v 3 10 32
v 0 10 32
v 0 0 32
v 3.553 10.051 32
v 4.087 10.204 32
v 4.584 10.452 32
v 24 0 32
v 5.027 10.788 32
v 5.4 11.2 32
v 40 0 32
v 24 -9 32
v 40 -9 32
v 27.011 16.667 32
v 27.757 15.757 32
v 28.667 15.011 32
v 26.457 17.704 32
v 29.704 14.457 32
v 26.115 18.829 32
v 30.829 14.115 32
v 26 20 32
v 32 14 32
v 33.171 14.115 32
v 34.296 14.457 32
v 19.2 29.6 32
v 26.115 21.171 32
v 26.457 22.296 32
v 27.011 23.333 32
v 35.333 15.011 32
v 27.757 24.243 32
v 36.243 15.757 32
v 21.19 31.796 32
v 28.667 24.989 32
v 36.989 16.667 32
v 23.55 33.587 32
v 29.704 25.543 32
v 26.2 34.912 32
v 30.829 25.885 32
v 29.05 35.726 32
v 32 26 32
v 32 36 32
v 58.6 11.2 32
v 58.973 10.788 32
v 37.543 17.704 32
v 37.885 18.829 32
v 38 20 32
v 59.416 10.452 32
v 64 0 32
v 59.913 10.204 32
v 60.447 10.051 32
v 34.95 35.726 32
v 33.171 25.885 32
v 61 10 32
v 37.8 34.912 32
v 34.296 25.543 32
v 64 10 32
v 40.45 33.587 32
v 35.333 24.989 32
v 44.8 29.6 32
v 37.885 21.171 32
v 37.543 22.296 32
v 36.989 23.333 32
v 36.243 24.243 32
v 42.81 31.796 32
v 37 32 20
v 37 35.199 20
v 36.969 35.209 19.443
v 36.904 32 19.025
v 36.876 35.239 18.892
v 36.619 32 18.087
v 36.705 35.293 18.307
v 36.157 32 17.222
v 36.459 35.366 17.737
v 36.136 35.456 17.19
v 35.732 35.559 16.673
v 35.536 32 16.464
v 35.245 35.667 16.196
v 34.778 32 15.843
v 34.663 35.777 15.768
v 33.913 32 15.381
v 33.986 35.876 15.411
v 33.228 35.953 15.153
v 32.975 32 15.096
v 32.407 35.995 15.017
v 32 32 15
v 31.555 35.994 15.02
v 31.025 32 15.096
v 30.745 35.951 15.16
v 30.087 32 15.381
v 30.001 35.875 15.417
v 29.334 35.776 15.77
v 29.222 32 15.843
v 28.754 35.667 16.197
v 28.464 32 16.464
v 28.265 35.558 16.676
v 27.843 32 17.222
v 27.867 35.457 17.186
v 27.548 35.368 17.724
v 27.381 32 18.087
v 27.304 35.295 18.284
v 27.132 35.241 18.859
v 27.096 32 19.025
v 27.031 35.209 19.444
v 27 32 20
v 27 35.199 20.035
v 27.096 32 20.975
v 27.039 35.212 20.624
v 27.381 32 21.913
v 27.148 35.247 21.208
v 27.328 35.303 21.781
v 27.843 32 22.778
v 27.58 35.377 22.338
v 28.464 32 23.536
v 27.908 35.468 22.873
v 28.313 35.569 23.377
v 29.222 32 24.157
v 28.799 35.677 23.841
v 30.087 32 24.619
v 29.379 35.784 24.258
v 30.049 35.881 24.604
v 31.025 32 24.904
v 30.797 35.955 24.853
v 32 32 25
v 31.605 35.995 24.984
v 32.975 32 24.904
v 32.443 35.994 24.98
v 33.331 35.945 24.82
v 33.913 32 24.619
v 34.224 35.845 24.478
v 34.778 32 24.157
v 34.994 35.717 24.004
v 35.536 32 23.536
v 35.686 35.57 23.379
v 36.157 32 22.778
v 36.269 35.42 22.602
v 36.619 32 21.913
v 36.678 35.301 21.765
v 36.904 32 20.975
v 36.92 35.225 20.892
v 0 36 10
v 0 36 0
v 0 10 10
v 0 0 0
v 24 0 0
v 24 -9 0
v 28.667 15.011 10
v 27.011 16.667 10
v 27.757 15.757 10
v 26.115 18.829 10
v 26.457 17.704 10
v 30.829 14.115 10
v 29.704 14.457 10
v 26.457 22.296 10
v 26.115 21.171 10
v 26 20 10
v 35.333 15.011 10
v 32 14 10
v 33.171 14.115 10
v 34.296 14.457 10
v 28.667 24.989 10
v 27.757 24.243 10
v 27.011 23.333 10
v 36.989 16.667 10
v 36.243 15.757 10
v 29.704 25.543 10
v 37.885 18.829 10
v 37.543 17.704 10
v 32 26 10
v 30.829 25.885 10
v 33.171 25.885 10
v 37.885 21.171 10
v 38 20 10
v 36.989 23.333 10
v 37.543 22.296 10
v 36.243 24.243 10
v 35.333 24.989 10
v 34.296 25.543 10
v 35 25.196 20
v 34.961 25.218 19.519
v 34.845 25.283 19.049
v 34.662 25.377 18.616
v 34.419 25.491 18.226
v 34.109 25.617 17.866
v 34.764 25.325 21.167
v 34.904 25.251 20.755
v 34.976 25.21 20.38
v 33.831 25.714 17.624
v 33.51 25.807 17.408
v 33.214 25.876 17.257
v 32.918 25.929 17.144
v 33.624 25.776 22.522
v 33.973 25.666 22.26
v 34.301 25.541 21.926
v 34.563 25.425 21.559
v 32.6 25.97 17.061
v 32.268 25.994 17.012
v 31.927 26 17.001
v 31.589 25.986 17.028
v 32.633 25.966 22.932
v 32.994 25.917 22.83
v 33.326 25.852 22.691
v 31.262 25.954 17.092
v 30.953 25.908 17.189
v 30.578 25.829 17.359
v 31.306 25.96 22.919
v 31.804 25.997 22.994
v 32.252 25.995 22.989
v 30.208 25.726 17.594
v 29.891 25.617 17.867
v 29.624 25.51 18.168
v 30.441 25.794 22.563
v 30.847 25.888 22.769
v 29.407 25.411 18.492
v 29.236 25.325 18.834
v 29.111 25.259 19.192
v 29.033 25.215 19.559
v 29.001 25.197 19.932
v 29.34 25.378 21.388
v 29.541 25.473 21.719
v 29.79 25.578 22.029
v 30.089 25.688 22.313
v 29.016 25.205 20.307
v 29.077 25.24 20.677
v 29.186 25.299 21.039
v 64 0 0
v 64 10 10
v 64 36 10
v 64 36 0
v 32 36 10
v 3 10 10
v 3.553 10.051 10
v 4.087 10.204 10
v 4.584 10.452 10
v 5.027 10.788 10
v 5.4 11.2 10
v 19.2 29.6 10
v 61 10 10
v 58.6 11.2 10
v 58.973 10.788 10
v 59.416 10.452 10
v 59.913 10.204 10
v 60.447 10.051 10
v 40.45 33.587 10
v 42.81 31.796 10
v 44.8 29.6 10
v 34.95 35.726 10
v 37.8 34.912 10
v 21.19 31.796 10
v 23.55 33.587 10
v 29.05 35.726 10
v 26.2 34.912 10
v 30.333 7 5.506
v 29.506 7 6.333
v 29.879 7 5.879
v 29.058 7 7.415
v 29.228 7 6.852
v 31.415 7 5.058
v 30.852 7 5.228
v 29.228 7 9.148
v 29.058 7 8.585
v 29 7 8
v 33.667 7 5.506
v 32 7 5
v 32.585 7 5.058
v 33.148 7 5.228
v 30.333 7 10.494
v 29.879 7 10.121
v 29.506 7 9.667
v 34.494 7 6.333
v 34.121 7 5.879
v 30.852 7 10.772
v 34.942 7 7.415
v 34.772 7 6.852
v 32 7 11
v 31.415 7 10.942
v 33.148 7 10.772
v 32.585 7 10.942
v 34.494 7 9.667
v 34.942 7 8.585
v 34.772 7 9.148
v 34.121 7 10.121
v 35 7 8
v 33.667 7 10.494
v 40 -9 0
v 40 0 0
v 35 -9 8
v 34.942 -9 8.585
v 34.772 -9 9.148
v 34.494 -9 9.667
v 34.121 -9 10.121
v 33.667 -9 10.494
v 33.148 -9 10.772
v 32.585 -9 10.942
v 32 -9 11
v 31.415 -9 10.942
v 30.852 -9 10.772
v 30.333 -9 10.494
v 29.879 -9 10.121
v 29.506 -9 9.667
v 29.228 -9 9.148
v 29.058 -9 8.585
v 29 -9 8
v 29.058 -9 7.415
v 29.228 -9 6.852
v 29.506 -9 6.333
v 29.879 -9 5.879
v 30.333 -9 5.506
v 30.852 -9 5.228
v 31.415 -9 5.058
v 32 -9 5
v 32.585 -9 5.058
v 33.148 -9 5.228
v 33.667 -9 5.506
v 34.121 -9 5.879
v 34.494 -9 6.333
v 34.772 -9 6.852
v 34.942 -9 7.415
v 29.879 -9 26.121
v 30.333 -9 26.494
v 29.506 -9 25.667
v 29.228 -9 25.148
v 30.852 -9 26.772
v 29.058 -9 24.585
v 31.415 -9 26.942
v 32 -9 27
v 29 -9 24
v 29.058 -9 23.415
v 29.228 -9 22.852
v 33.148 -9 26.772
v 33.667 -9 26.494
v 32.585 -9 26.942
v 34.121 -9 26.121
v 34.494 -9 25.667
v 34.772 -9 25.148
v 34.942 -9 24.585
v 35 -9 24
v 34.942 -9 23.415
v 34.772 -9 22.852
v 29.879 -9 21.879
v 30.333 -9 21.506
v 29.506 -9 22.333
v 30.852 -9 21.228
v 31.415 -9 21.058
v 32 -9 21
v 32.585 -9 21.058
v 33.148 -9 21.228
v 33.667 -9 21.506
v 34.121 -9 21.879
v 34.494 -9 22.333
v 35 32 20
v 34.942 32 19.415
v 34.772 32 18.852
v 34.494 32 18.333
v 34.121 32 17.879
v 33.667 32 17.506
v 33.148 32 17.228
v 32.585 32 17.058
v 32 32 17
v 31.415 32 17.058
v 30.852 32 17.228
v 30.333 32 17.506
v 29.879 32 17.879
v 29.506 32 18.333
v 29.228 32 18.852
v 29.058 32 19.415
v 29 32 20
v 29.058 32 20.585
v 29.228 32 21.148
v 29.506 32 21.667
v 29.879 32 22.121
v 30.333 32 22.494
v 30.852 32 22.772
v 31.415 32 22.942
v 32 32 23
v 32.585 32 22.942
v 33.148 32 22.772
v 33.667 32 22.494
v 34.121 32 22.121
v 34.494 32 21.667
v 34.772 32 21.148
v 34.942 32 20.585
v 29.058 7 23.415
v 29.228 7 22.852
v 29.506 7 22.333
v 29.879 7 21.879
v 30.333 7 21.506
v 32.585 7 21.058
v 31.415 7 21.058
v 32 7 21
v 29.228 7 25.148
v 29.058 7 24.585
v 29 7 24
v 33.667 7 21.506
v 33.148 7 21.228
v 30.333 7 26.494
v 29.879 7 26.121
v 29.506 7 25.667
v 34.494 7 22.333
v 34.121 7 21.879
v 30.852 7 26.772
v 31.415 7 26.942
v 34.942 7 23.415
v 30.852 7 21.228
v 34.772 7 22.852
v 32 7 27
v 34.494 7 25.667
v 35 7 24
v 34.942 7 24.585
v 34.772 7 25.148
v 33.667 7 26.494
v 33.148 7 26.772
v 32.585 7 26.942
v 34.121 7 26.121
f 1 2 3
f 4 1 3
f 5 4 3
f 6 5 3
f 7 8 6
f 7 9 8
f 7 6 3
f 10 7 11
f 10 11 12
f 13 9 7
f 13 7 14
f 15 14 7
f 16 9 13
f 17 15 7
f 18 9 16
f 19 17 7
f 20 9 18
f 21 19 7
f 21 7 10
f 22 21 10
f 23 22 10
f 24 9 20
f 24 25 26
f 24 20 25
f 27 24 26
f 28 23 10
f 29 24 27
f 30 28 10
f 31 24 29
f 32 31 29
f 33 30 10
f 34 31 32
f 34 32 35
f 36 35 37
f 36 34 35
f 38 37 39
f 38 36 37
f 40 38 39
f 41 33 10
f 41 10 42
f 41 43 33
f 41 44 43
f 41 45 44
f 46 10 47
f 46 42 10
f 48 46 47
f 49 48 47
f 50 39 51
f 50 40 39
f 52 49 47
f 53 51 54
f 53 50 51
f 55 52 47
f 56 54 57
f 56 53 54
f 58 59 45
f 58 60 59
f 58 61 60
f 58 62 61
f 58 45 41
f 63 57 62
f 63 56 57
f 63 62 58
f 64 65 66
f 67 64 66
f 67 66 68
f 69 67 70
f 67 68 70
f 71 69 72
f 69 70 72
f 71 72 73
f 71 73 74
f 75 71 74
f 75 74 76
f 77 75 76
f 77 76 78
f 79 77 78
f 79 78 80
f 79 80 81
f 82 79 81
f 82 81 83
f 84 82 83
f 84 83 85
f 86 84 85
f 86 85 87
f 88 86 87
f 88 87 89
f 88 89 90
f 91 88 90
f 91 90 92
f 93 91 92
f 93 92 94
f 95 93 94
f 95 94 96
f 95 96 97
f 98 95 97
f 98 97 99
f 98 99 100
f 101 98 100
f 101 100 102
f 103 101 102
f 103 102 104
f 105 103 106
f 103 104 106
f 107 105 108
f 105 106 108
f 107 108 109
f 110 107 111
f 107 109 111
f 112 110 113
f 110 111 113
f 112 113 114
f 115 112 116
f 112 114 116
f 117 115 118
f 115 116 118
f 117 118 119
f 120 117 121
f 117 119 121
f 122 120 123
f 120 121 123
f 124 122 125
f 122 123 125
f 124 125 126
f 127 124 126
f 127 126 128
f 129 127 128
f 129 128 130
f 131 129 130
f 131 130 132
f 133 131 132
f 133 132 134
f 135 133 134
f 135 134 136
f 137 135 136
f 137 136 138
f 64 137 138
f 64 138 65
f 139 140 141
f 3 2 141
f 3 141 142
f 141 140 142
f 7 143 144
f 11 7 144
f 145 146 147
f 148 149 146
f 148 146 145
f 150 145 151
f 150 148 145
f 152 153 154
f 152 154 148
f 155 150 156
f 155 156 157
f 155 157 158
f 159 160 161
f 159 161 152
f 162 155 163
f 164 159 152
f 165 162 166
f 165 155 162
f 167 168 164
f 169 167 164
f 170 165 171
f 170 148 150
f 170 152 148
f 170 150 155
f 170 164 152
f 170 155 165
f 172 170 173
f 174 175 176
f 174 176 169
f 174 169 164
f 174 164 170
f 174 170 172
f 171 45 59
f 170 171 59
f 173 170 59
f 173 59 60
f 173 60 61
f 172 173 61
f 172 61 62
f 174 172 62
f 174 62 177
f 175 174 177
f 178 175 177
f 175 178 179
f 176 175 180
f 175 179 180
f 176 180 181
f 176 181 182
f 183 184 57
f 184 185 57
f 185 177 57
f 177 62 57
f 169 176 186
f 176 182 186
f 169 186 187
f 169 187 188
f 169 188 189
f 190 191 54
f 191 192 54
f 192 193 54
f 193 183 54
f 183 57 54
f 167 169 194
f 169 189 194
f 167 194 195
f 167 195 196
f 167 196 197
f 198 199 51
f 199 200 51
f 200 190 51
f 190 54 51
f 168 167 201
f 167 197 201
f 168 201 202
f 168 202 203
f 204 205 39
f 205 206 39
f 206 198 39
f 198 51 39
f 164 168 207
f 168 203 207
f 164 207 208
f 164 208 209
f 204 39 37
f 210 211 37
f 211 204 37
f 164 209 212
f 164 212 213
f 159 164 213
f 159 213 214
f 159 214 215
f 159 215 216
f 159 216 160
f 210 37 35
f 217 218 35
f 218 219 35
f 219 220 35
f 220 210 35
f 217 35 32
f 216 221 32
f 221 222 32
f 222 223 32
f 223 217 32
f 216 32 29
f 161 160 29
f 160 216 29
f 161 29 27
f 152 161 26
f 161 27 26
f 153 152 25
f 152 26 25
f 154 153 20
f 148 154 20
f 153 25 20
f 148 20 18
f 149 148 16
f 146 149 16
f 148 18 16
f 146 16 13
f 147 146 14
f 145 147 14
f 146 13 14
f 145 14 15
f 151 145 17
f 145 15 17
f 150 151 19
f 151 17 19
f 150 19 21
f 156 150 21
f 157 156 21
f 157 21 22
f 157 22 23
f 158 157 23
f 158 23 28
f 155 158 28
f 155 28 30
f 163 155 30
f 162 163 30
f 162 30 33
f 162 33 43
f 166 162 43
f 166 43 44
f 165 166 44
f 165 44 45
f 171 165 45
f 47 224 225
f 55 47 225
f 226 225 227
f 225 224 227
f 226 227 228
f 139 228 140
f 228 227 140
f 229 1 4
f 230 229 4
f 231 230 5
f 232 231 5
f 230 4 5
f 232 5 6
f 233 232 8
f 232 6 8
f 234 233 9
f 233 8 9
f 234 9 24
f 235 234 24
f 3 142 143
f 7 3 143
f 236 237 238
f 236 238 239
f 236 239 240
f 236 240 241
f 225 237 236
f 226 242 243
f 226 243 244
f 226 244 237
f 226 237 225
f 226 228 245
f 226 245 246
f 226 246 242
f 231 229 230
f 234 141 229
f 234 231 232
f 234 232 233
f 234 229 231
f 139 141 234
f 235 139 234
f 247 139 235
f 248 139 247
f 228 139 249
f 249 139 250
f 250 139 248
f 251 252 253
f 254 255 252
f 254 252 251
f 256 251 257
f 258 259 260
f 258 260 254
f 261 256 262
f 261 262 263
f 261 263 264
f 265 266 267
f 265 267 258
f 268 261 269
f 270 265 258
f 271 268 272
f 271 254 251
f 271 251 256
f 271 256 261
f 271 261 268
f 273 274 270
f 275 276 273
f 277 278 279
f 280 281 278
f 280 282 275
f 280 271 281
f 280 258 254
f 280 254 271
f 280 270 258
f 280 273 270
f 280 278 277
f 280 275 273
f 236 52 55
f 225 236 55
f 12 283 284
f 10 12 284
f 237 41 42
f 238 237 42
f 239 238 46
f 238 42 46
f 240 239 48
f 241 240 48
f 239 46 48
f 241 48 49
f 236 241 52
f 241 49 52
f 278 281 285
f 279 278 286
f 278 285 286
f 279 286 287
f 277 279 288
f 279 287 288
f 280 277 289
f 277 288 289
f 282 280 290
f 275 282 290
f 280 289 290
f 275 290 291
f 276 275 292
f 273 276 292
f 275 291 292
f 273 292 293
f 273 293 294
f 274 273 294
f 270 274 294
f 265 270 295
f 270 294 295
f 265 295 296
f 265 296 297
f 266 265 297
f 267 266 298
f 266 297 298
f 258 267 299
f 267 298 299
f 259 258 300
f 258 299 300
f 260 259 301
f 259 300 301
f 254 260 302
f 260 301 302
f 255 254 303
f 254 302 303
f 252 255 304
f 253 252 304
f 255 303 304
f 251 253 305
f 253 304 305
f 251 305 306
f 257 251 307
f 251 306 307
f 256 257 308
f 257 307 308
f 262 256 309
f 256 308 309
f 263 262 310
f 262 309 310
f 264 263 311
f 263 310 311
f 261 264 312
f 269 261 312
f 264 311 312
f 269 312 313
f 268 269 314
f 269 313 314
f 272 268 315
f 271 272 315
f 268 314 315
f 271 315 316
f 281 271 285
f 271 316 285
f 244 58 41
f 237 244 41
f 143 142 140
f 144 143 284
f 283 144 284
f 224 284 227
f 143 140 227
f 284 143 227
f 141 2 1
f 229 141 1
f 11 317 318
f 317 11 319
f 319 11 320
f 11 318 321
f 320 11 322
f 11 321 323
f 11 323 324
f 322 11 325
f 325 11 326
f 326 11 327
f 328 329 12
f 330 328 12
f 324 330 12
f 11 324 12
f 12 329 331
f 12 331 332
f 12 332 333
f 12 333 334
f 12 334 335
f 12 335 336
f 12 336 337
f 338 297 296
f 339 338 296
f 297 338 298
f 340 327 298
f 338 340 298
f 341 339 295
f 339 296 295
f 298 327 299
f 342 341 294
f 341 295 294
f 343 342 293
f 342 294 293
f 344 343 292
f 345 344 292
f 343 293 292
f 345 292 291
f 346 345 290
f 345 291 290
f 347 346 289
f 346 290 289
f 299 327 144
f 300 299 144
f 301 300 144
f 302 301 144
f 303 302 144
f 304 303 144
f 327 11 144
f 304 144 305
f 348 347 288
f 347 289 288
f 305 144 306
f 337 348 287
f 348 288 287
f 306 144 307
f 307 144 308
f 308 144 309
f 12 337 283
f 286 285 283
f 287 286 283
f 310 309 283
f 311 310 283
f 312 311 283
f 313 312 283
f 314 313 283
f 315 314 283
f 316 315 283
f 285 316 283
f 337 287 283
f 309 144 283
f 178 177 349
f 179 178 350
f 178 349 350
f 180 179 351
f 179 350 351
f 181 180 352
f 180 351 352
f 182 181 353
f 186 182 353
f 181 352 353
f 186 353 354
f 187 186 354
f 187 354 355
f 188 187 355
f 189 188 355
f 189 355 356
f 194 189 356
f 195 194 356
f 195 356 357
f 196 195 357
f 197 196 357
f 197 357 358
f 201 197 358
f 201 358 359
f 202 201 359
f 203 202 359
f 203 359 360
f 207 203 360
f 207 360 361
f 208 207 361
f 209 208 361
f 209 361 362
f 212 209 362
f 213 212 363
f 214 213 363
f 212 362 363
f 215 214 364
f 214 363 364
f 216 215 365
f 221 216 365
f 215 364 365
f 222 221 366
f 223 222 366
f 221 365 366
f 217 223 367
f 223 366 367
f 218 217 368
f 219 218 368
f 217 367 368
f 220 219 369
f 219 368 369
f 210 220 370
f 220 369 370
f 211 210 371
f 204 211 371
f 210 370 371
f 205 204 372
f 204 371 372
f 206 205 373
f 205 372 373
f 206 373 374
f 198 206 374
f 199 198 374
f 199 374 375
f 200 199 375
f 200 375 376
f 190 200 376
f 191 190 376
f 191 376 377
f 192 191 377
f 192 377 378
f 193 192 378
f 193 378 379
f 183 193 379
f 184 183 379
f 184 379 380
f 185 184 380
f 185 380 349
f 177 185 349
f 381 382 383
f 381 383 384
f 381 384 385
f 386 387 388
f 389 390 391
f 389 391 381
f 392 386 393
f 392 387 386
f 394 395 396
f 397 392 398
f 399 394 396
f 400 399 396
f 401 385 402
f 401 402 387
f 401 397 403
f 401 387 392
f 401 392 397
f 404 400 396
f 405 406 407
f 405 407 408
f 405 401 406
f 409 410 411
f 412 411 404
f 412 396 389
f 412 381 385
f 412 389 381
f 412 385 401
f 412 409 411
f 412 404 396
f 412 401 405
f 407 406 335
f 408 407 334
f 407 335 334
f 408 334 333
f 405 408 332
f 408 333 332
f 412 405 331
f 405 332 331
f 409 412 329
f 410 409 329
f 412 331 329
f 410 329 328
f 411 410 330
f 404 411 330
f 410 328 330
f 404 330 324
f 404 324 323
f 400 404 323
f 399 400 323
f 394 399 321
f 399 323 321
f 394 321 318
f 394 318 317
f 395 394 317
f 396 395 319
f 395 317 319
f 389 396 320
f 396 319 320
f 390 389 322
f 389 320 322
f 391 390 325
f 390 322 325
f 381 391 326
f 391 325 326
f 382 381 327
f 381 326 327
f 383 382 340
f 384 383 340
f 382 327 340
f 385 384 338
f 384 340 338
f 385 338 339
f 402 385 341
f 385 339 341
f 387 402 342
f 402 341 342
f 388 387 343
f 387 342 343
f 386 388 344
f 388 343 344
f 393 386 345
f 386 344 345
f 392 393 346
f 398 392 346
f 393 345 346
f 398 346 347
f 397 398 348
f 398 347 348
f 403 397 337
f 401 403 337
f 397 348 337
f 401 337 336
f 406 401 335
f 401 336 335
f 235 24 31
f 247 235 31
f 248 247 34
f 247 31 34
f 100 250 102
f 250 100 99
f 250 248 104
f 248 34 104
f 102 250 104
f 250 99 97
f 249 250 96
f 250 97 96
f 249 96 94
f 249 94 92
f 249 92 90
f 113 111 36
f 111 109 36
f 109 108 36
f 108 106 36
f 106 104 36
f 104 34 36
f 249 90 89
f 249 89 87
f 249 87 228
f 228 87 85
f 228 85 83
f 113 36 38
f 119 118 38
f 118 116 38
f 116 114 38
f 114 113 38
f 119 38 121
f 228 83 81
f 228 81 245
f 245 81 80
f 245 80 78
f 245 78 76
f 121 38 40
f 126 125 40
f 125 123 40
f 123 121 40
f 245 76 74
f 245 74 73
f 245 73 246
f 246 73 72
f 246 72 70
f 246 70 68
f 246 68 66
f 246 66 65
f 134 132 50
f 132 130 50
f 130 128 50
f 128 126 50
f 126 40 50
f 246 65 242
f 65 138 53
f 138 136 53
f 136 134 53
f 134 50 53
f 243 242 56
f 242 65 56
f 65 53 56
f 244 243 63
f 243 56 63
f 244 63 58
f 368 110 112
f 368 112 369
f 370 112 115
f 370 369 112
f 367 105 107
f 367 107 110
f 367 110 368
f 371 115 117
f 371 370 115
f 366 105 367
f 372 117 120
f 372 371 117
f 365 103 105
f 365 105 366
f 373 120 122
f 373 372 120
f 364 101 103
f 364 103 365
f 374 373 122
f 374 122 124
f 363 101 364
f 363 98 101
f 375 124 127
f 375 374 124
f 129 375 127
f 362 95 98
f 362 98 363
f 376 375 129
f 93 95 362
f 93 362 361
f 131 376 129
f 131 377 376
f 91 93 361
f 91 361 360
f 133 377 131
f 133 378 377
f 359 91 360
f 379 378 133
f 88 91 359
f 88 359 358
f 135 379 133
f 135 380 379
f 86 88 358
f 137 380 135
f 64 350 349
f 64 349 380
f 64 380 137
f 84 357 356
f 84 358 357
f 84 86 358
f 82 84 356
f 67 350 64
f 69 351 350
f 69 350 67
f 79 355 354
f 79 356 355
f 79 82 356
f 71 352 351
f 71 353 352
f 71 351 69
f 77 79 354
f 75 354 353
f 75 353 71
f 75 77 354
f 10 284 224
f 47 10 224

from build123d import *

# Parameters (mm, degrees)
BOSS_EXTRUDE1_DEPTH            = 32
SKETCH2_R                      = 6
CUT_EXTRUDE1_DEPTH             = 22
SKETCH3_R                      = 5
CUT_EXTRUDE2_DEPTH             = 4
CUT_EXTRUDE3_REACH             = 43
SKETCH4_R                      = 3
CUT_EXTRUDE3_DIRECTION_2_DEPTH = 5.0000001
SKETCH5_R                      = 3
CUT_EXTRUDE4_DEPTH             = 16


with BuildPart() as part:
    # Sketch1 → Boss-Extrude1 (new body)
    with BuildSketch(Plane.XY):
        Polygon((40, 0), (64, 0), (64, 36), (0, 36), (0, 0), (24, 0), (24, -9), (40, -9), align=None)
    extrude(amount=BOSS_EXTRUDE1_DEPTH)

    # Sketch2 → Cut-Extrude1 (cut)
    with BuildSketch(Plane.XY.offset(32)):
        with BuildLine():
            Line((0, 36), (0, 10))
            Line((0, 10), (3, 10))
            ThreePointArc((3, 10), (4.341640786, 10.316718427), (5.4, 11.2))
            Line((5.4, 11.2), (19.2, 29.6))
            ThreePointArc((19.2, 29.6), (24.844582472, 34.310835056), (32, 36))
            Line((32, 36), (0, 36))
        make_face()
        with BuildLine():
            Line((64, 36), (32, 36))
            ThreePointArc((32, 36), (39.155417528, 34.310835056), (44.8, 29.6))
            Line((44.8, 29.6), (58.6, 11.2))
            ThreePointArc((58.6, 11.2), (59.658359214, 10.316718427), (61, 10))
            Line((61, 10), (64, 10))
            Line((64, 10), (64, 36))
        make_face()
        with Locations((32, 20)):
            Circle(SKETCH2_R)
    extrude(amount=-CUT_EXTRUDE1_DEPTH, mode=Mode.SUBTRACT)

    # Sketch3 → Cut-Extrude2 (cut)
    with BuildSketch(Plane(origin=(0, 36, 0), x_dir=(1, 0, 0), z_dir=(0, 1, 0))):
        with Locations((32, -20)):
            Circle(SKETCH3_R)
    extrude(amount=-CUT_EXTRUDE2_DEPTH, mode=Mode.SUBTRACT)

    # Sketch4 → Cut-Extrude3 (cut, up to next)
    with BuildSketch(Plane(origin=(0, 32, 0), x_dir=(1, 0, 0), z_dir=(0, 1, 0)), mode=Mode.PRIVATE) as cut_extrude3_sk1:
        with Locations((32, -20)):
            Circle(SKETCH4_R)
    cut_extrude3_tool1 = extrude(cut_extrude3_sk1.sketch, amount=-CUT_EXTRUDE3_REACH, mode=Mode.PRIVATE) & part.part
    add(cut_extrude3_tool1.solids().sort_by_distance((32, 32, 20))[0], mode=Mode.SUBTRACT)

    # Sketch4 → Cut-Extrude3 direction 2 (cut)
    with BuildSketch(Plane(origin=(0, 32, 0), x_dir=(1, 0, 0), z_dir=(0, 1, 0))):
        with Locations((32, -20)):
            Circle(SKETCH4_R)
    extrude(amount=CUT_EXTRUDE3_DIRECTION_2_DEPTH, mode=Mode.SUBTRACT)

    # Sketch5 → Cut-Extrude4 (cut)
    with BuildSketch(Plane.XZ.offset(9)):
        with Locations((32, 24)):
            Circle(SKETCH5_R)
        with Locations((32, 8)):
            Circle(SKETCH5_R)
    extrude(amount=-CUT_EXTRUDE4_DEPTH, mode=Mode.SUBTRACT)


solid = part.part
